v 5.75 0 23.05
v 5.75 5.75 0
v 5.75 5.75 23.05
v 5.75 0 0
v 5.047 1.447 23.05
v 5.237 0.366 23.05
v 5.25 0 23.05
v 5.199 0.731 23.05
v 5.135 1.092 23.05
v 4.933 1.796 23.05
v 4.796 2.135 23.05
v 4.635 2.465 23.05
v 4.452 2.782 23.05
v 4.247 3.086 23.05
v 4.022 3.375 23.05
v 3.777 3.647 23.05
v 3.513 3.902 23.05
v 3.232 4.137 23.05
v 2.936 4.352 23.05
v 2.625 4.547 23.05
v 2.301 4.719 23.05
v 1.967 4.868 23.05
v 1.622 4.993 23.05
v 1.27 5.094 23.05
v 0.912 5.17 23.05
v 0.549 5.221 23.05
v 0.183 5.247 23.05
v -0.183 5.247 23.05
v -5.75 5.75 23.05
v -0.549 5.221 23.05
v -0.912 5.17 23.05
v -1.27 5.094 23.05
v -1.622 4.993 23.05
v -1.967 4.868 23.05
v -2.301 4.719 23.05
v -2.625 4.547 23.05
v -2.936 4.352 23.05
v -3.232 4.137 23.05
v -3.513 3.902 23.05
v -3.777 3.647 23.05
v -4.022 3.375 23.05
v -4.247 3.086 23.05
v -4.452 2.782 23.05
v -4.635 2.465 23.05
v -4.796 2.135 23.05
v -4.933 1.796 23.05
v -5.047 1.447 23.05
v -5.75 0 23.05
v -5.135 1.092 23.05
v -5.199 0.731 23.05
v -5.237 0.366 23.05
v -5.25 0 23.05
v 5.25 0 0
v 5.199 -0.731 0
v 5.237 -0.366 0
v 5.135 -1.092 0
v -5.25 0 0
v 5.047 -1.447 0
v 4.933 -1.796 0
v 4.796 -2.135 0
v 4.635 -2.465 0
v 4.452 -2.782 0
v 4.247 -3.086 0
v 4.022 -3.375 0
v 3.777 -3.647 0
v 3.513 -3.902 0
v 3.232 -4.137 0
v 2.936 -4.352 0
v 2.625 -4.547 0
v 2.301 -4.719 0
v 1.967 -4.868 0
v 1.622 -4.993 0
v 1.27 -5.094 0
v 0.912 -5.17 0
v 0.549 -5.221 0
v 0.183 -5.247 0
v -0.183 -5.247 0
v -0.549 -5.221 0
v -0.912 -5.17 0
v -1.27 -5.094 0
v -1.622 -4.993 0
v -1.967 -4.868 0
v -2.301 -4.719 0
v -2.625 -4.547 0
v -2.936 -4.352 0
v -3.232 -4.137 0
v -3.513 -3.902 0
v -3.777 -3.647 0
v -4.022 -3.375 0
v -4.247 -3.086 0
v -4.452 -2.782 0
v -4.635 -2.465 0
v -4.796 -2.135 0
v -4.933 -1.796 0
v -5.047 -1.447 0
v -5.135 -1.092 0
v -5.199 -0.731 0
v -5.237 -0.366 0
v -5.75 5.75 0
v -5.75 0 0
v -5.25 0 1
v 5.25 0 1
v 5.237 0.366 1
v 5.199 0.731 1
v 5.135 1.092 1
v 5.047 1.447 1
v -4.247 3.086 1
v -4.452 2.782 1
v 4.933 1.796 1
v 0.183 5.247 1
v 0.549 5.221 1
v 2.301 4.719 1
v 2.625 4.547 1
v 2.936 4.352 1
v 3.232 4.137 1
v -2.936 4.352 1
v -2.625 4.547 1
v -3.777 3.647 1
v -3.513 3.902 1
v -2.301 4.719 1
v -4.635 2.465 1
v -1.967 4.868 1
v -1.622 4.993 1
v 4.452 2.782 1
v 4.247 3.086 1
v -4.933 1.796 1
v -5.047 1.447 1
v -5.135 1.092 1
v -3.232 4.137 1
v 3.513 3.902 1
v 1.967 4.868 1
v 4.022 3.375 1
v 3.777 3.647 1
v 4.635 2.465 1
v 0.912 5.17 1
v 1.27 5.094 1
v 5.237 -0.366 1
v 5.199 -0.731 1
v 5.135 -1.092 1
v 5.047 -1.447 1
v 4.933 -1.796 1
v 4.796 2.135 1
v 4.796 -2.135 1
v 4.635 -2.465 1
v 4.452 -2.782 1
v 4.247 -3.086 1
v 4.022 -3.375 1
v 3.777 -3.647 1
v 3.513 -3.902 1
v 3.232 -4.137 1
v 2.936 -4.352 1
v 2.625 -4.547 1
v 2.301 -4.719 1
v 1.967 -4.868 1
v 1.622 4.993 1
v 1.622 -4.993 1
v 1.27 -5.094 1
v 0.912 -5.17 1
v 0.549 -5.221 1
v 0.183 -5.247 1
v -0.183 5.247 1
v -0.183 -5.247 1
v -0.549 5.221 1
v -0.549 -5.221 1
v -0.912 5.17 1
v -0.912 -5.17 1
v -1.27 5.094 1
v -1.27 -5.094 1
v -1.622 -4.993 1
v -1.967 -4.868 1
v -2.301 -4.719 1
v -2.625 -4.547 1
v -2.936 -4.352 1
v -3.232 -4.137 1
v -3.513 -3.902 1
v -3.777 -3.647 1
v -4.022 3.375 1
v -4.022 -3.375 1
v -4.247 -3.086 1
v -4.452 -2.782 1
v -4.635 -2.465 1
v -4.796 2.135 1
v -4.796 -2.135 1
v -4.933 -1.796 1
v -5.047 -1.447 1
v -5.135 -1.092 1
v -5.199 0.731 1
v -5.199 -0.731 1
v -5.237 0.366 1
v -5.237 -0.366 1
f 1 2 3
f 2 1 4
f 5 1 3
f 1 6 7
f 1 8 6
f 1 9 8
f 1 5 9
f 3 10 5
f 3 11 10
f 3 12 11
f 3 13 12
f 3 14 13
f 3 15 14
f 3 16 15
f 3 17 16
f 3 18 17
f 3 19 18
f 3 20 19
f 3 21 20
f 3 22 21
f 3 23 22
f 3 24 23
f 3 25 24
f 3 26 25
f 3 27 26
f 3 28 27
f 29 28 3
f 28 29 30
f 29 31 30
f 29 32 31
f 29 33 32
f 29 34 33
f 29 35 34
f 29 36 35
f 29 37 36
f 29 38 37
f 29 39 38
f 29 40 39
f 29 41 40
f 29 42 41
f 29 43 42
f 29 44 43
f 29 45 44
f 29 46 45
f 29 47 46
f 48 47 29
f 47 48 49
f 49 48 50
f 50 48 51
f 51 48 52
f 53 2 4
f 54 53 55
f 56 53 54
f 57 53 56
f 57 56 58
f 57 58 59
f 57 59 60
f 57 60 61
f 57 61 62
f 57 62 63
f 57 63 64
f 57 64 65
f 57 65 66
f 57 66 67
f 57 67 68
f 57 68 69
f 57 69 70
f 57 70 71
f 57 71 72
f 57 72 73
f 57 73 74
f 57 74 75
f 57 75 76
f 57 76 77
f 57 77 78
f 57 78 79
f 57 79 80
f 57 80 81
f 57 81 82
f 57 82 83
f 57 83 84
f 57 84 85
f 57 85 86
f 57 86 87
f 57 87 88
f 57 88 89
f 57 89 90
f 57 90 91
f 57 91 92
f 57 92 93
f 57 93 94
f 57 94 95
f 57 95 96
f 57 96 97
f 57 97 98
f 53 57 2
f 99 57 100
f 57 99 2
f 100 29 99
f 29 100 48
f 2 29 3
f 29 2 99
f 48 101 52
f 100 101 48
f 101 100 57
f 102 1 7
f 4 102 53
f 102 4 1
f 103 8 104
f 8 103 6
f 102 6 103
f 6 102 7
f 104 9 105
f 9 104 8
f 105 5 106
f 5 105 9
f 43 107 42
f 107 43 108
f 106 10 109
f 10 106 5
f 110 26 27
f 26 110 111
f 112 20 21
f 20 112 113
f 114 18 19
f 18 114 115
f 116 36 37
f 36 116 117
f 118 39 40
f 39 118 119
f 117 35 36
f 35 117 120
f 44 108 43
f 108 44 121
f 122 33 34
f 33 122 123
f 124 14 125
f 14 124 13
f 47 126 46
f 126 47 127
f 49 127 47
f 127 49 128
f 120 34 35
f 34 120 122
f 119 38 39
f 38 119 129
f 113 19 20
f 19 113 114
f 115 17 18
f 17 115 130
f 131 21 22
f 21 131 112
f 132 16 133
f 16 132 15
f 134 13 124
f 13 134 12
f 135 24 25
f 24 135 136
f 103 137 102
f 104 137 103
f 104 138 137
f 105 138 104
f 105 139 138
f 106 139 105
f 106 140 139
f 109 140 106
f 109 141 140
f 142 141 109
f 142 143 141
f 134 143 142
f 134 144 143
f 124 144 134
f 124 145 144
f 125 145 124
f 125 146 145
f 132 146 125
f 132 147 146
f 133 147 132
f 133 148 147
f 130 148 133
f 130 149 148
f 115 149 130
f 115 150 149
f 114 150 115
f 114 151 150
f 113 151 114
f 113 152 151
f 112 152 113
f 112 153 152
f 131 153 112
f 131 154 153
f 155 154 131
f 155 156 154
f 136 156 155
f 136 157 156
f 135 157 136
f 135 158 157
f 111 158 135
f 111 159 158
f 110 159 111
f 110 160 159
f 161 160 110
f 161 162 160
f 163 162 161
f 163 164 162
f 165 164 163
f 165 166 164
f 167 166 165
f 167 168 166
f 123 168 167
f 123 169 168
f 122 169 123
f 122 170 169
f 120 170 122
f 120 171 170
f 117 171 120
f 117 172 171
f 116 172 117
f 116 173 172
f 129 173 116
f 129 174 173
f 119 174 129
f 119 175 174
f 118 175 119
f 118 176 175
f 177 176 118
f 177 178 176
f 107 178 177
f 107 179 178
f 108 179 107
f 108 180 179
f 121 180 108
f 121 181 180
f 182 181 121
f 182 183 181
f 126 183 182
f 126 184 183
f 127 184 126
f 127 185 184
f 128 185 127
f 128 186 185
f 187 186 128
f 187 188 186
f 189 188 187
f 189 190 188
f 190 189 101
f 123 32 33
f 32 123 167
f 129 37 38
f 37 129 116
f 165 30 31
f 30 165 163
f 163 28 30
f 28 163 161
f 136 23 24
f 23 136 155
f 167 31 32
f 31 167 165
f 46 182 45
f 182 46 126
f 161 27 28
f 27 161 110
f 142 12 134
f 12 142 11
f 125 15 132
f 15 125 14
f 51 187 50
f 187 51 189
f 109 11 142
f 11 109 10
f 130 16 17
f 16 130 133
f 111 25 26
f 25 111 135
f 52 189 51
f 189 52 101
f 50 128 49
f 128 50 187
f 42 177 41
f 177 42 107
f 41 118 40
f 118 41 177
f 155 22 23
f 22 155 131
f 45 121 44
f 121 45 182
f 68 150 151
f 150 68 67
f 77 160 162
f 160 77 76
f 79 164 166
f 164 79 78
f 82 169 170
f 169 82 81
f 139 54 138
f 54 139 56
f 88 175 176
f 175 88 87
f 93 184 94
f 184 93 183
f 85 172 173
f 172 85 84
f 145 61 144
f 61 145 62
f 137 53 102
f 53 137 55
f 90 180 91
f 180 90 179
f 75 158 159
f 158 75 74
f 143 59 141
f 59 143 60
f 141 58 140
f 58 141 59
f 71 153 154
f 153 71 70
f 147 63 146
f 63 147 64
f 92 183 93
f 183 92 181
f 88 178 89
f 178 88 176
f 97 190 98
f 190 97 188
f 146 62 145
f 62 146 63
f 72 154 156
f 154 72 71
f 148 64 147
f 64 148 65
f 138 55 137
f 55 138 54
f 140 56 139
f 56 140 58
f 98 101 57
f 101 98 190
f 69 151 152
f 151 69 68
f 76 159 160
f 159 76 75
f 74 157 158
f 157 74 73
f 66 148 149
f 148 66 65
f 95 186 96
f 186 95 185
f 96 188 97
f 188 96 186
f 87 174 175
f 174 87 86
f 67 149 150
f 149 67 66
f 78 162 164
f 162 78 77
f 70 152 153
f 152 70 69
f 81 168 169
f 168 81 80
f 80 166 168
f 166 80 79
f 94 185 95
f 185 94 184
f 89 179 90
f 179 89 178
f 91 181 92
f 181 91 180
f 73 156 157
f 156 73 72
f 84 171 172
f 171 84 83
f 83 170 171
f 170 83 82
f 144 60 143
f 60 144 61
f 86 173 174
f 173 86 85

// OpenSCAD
coin_diameter = 10;
coin_depth = 1;
number_of_coins = 20;

coin_diameter_space = 0.5;
coin_depth_space = 0.05;

wall_width = 1;
floor_depth = 1;

slot_height = coin_depth + coin_depth_space * 2;

tube_inner_height = coin_depth * number_of_coins + coin_depth_space * (number_of_coins - 1) + slot_height;
tube_inner_diameter = coin_diameter + coin_diameter_space;

tube_outer_height = tube_inner_height + floor_depth;
tube_outer_diameter = tube_inner_diameter + wall_width;

$fn = 90;

difference()
{
	translate([-tube_outer_diameter/2, 0, 0])
	cube([tube_outer_diameter, tube_outer_diameter/2, tube_outer_height]);

	translate([0, 0, floor_depth])
	cylinder(h=tube_inner_height + 1, d=tube_inner_diameter);
}

cylinder(h=floor_depth, d=tube_inner_diameter);
